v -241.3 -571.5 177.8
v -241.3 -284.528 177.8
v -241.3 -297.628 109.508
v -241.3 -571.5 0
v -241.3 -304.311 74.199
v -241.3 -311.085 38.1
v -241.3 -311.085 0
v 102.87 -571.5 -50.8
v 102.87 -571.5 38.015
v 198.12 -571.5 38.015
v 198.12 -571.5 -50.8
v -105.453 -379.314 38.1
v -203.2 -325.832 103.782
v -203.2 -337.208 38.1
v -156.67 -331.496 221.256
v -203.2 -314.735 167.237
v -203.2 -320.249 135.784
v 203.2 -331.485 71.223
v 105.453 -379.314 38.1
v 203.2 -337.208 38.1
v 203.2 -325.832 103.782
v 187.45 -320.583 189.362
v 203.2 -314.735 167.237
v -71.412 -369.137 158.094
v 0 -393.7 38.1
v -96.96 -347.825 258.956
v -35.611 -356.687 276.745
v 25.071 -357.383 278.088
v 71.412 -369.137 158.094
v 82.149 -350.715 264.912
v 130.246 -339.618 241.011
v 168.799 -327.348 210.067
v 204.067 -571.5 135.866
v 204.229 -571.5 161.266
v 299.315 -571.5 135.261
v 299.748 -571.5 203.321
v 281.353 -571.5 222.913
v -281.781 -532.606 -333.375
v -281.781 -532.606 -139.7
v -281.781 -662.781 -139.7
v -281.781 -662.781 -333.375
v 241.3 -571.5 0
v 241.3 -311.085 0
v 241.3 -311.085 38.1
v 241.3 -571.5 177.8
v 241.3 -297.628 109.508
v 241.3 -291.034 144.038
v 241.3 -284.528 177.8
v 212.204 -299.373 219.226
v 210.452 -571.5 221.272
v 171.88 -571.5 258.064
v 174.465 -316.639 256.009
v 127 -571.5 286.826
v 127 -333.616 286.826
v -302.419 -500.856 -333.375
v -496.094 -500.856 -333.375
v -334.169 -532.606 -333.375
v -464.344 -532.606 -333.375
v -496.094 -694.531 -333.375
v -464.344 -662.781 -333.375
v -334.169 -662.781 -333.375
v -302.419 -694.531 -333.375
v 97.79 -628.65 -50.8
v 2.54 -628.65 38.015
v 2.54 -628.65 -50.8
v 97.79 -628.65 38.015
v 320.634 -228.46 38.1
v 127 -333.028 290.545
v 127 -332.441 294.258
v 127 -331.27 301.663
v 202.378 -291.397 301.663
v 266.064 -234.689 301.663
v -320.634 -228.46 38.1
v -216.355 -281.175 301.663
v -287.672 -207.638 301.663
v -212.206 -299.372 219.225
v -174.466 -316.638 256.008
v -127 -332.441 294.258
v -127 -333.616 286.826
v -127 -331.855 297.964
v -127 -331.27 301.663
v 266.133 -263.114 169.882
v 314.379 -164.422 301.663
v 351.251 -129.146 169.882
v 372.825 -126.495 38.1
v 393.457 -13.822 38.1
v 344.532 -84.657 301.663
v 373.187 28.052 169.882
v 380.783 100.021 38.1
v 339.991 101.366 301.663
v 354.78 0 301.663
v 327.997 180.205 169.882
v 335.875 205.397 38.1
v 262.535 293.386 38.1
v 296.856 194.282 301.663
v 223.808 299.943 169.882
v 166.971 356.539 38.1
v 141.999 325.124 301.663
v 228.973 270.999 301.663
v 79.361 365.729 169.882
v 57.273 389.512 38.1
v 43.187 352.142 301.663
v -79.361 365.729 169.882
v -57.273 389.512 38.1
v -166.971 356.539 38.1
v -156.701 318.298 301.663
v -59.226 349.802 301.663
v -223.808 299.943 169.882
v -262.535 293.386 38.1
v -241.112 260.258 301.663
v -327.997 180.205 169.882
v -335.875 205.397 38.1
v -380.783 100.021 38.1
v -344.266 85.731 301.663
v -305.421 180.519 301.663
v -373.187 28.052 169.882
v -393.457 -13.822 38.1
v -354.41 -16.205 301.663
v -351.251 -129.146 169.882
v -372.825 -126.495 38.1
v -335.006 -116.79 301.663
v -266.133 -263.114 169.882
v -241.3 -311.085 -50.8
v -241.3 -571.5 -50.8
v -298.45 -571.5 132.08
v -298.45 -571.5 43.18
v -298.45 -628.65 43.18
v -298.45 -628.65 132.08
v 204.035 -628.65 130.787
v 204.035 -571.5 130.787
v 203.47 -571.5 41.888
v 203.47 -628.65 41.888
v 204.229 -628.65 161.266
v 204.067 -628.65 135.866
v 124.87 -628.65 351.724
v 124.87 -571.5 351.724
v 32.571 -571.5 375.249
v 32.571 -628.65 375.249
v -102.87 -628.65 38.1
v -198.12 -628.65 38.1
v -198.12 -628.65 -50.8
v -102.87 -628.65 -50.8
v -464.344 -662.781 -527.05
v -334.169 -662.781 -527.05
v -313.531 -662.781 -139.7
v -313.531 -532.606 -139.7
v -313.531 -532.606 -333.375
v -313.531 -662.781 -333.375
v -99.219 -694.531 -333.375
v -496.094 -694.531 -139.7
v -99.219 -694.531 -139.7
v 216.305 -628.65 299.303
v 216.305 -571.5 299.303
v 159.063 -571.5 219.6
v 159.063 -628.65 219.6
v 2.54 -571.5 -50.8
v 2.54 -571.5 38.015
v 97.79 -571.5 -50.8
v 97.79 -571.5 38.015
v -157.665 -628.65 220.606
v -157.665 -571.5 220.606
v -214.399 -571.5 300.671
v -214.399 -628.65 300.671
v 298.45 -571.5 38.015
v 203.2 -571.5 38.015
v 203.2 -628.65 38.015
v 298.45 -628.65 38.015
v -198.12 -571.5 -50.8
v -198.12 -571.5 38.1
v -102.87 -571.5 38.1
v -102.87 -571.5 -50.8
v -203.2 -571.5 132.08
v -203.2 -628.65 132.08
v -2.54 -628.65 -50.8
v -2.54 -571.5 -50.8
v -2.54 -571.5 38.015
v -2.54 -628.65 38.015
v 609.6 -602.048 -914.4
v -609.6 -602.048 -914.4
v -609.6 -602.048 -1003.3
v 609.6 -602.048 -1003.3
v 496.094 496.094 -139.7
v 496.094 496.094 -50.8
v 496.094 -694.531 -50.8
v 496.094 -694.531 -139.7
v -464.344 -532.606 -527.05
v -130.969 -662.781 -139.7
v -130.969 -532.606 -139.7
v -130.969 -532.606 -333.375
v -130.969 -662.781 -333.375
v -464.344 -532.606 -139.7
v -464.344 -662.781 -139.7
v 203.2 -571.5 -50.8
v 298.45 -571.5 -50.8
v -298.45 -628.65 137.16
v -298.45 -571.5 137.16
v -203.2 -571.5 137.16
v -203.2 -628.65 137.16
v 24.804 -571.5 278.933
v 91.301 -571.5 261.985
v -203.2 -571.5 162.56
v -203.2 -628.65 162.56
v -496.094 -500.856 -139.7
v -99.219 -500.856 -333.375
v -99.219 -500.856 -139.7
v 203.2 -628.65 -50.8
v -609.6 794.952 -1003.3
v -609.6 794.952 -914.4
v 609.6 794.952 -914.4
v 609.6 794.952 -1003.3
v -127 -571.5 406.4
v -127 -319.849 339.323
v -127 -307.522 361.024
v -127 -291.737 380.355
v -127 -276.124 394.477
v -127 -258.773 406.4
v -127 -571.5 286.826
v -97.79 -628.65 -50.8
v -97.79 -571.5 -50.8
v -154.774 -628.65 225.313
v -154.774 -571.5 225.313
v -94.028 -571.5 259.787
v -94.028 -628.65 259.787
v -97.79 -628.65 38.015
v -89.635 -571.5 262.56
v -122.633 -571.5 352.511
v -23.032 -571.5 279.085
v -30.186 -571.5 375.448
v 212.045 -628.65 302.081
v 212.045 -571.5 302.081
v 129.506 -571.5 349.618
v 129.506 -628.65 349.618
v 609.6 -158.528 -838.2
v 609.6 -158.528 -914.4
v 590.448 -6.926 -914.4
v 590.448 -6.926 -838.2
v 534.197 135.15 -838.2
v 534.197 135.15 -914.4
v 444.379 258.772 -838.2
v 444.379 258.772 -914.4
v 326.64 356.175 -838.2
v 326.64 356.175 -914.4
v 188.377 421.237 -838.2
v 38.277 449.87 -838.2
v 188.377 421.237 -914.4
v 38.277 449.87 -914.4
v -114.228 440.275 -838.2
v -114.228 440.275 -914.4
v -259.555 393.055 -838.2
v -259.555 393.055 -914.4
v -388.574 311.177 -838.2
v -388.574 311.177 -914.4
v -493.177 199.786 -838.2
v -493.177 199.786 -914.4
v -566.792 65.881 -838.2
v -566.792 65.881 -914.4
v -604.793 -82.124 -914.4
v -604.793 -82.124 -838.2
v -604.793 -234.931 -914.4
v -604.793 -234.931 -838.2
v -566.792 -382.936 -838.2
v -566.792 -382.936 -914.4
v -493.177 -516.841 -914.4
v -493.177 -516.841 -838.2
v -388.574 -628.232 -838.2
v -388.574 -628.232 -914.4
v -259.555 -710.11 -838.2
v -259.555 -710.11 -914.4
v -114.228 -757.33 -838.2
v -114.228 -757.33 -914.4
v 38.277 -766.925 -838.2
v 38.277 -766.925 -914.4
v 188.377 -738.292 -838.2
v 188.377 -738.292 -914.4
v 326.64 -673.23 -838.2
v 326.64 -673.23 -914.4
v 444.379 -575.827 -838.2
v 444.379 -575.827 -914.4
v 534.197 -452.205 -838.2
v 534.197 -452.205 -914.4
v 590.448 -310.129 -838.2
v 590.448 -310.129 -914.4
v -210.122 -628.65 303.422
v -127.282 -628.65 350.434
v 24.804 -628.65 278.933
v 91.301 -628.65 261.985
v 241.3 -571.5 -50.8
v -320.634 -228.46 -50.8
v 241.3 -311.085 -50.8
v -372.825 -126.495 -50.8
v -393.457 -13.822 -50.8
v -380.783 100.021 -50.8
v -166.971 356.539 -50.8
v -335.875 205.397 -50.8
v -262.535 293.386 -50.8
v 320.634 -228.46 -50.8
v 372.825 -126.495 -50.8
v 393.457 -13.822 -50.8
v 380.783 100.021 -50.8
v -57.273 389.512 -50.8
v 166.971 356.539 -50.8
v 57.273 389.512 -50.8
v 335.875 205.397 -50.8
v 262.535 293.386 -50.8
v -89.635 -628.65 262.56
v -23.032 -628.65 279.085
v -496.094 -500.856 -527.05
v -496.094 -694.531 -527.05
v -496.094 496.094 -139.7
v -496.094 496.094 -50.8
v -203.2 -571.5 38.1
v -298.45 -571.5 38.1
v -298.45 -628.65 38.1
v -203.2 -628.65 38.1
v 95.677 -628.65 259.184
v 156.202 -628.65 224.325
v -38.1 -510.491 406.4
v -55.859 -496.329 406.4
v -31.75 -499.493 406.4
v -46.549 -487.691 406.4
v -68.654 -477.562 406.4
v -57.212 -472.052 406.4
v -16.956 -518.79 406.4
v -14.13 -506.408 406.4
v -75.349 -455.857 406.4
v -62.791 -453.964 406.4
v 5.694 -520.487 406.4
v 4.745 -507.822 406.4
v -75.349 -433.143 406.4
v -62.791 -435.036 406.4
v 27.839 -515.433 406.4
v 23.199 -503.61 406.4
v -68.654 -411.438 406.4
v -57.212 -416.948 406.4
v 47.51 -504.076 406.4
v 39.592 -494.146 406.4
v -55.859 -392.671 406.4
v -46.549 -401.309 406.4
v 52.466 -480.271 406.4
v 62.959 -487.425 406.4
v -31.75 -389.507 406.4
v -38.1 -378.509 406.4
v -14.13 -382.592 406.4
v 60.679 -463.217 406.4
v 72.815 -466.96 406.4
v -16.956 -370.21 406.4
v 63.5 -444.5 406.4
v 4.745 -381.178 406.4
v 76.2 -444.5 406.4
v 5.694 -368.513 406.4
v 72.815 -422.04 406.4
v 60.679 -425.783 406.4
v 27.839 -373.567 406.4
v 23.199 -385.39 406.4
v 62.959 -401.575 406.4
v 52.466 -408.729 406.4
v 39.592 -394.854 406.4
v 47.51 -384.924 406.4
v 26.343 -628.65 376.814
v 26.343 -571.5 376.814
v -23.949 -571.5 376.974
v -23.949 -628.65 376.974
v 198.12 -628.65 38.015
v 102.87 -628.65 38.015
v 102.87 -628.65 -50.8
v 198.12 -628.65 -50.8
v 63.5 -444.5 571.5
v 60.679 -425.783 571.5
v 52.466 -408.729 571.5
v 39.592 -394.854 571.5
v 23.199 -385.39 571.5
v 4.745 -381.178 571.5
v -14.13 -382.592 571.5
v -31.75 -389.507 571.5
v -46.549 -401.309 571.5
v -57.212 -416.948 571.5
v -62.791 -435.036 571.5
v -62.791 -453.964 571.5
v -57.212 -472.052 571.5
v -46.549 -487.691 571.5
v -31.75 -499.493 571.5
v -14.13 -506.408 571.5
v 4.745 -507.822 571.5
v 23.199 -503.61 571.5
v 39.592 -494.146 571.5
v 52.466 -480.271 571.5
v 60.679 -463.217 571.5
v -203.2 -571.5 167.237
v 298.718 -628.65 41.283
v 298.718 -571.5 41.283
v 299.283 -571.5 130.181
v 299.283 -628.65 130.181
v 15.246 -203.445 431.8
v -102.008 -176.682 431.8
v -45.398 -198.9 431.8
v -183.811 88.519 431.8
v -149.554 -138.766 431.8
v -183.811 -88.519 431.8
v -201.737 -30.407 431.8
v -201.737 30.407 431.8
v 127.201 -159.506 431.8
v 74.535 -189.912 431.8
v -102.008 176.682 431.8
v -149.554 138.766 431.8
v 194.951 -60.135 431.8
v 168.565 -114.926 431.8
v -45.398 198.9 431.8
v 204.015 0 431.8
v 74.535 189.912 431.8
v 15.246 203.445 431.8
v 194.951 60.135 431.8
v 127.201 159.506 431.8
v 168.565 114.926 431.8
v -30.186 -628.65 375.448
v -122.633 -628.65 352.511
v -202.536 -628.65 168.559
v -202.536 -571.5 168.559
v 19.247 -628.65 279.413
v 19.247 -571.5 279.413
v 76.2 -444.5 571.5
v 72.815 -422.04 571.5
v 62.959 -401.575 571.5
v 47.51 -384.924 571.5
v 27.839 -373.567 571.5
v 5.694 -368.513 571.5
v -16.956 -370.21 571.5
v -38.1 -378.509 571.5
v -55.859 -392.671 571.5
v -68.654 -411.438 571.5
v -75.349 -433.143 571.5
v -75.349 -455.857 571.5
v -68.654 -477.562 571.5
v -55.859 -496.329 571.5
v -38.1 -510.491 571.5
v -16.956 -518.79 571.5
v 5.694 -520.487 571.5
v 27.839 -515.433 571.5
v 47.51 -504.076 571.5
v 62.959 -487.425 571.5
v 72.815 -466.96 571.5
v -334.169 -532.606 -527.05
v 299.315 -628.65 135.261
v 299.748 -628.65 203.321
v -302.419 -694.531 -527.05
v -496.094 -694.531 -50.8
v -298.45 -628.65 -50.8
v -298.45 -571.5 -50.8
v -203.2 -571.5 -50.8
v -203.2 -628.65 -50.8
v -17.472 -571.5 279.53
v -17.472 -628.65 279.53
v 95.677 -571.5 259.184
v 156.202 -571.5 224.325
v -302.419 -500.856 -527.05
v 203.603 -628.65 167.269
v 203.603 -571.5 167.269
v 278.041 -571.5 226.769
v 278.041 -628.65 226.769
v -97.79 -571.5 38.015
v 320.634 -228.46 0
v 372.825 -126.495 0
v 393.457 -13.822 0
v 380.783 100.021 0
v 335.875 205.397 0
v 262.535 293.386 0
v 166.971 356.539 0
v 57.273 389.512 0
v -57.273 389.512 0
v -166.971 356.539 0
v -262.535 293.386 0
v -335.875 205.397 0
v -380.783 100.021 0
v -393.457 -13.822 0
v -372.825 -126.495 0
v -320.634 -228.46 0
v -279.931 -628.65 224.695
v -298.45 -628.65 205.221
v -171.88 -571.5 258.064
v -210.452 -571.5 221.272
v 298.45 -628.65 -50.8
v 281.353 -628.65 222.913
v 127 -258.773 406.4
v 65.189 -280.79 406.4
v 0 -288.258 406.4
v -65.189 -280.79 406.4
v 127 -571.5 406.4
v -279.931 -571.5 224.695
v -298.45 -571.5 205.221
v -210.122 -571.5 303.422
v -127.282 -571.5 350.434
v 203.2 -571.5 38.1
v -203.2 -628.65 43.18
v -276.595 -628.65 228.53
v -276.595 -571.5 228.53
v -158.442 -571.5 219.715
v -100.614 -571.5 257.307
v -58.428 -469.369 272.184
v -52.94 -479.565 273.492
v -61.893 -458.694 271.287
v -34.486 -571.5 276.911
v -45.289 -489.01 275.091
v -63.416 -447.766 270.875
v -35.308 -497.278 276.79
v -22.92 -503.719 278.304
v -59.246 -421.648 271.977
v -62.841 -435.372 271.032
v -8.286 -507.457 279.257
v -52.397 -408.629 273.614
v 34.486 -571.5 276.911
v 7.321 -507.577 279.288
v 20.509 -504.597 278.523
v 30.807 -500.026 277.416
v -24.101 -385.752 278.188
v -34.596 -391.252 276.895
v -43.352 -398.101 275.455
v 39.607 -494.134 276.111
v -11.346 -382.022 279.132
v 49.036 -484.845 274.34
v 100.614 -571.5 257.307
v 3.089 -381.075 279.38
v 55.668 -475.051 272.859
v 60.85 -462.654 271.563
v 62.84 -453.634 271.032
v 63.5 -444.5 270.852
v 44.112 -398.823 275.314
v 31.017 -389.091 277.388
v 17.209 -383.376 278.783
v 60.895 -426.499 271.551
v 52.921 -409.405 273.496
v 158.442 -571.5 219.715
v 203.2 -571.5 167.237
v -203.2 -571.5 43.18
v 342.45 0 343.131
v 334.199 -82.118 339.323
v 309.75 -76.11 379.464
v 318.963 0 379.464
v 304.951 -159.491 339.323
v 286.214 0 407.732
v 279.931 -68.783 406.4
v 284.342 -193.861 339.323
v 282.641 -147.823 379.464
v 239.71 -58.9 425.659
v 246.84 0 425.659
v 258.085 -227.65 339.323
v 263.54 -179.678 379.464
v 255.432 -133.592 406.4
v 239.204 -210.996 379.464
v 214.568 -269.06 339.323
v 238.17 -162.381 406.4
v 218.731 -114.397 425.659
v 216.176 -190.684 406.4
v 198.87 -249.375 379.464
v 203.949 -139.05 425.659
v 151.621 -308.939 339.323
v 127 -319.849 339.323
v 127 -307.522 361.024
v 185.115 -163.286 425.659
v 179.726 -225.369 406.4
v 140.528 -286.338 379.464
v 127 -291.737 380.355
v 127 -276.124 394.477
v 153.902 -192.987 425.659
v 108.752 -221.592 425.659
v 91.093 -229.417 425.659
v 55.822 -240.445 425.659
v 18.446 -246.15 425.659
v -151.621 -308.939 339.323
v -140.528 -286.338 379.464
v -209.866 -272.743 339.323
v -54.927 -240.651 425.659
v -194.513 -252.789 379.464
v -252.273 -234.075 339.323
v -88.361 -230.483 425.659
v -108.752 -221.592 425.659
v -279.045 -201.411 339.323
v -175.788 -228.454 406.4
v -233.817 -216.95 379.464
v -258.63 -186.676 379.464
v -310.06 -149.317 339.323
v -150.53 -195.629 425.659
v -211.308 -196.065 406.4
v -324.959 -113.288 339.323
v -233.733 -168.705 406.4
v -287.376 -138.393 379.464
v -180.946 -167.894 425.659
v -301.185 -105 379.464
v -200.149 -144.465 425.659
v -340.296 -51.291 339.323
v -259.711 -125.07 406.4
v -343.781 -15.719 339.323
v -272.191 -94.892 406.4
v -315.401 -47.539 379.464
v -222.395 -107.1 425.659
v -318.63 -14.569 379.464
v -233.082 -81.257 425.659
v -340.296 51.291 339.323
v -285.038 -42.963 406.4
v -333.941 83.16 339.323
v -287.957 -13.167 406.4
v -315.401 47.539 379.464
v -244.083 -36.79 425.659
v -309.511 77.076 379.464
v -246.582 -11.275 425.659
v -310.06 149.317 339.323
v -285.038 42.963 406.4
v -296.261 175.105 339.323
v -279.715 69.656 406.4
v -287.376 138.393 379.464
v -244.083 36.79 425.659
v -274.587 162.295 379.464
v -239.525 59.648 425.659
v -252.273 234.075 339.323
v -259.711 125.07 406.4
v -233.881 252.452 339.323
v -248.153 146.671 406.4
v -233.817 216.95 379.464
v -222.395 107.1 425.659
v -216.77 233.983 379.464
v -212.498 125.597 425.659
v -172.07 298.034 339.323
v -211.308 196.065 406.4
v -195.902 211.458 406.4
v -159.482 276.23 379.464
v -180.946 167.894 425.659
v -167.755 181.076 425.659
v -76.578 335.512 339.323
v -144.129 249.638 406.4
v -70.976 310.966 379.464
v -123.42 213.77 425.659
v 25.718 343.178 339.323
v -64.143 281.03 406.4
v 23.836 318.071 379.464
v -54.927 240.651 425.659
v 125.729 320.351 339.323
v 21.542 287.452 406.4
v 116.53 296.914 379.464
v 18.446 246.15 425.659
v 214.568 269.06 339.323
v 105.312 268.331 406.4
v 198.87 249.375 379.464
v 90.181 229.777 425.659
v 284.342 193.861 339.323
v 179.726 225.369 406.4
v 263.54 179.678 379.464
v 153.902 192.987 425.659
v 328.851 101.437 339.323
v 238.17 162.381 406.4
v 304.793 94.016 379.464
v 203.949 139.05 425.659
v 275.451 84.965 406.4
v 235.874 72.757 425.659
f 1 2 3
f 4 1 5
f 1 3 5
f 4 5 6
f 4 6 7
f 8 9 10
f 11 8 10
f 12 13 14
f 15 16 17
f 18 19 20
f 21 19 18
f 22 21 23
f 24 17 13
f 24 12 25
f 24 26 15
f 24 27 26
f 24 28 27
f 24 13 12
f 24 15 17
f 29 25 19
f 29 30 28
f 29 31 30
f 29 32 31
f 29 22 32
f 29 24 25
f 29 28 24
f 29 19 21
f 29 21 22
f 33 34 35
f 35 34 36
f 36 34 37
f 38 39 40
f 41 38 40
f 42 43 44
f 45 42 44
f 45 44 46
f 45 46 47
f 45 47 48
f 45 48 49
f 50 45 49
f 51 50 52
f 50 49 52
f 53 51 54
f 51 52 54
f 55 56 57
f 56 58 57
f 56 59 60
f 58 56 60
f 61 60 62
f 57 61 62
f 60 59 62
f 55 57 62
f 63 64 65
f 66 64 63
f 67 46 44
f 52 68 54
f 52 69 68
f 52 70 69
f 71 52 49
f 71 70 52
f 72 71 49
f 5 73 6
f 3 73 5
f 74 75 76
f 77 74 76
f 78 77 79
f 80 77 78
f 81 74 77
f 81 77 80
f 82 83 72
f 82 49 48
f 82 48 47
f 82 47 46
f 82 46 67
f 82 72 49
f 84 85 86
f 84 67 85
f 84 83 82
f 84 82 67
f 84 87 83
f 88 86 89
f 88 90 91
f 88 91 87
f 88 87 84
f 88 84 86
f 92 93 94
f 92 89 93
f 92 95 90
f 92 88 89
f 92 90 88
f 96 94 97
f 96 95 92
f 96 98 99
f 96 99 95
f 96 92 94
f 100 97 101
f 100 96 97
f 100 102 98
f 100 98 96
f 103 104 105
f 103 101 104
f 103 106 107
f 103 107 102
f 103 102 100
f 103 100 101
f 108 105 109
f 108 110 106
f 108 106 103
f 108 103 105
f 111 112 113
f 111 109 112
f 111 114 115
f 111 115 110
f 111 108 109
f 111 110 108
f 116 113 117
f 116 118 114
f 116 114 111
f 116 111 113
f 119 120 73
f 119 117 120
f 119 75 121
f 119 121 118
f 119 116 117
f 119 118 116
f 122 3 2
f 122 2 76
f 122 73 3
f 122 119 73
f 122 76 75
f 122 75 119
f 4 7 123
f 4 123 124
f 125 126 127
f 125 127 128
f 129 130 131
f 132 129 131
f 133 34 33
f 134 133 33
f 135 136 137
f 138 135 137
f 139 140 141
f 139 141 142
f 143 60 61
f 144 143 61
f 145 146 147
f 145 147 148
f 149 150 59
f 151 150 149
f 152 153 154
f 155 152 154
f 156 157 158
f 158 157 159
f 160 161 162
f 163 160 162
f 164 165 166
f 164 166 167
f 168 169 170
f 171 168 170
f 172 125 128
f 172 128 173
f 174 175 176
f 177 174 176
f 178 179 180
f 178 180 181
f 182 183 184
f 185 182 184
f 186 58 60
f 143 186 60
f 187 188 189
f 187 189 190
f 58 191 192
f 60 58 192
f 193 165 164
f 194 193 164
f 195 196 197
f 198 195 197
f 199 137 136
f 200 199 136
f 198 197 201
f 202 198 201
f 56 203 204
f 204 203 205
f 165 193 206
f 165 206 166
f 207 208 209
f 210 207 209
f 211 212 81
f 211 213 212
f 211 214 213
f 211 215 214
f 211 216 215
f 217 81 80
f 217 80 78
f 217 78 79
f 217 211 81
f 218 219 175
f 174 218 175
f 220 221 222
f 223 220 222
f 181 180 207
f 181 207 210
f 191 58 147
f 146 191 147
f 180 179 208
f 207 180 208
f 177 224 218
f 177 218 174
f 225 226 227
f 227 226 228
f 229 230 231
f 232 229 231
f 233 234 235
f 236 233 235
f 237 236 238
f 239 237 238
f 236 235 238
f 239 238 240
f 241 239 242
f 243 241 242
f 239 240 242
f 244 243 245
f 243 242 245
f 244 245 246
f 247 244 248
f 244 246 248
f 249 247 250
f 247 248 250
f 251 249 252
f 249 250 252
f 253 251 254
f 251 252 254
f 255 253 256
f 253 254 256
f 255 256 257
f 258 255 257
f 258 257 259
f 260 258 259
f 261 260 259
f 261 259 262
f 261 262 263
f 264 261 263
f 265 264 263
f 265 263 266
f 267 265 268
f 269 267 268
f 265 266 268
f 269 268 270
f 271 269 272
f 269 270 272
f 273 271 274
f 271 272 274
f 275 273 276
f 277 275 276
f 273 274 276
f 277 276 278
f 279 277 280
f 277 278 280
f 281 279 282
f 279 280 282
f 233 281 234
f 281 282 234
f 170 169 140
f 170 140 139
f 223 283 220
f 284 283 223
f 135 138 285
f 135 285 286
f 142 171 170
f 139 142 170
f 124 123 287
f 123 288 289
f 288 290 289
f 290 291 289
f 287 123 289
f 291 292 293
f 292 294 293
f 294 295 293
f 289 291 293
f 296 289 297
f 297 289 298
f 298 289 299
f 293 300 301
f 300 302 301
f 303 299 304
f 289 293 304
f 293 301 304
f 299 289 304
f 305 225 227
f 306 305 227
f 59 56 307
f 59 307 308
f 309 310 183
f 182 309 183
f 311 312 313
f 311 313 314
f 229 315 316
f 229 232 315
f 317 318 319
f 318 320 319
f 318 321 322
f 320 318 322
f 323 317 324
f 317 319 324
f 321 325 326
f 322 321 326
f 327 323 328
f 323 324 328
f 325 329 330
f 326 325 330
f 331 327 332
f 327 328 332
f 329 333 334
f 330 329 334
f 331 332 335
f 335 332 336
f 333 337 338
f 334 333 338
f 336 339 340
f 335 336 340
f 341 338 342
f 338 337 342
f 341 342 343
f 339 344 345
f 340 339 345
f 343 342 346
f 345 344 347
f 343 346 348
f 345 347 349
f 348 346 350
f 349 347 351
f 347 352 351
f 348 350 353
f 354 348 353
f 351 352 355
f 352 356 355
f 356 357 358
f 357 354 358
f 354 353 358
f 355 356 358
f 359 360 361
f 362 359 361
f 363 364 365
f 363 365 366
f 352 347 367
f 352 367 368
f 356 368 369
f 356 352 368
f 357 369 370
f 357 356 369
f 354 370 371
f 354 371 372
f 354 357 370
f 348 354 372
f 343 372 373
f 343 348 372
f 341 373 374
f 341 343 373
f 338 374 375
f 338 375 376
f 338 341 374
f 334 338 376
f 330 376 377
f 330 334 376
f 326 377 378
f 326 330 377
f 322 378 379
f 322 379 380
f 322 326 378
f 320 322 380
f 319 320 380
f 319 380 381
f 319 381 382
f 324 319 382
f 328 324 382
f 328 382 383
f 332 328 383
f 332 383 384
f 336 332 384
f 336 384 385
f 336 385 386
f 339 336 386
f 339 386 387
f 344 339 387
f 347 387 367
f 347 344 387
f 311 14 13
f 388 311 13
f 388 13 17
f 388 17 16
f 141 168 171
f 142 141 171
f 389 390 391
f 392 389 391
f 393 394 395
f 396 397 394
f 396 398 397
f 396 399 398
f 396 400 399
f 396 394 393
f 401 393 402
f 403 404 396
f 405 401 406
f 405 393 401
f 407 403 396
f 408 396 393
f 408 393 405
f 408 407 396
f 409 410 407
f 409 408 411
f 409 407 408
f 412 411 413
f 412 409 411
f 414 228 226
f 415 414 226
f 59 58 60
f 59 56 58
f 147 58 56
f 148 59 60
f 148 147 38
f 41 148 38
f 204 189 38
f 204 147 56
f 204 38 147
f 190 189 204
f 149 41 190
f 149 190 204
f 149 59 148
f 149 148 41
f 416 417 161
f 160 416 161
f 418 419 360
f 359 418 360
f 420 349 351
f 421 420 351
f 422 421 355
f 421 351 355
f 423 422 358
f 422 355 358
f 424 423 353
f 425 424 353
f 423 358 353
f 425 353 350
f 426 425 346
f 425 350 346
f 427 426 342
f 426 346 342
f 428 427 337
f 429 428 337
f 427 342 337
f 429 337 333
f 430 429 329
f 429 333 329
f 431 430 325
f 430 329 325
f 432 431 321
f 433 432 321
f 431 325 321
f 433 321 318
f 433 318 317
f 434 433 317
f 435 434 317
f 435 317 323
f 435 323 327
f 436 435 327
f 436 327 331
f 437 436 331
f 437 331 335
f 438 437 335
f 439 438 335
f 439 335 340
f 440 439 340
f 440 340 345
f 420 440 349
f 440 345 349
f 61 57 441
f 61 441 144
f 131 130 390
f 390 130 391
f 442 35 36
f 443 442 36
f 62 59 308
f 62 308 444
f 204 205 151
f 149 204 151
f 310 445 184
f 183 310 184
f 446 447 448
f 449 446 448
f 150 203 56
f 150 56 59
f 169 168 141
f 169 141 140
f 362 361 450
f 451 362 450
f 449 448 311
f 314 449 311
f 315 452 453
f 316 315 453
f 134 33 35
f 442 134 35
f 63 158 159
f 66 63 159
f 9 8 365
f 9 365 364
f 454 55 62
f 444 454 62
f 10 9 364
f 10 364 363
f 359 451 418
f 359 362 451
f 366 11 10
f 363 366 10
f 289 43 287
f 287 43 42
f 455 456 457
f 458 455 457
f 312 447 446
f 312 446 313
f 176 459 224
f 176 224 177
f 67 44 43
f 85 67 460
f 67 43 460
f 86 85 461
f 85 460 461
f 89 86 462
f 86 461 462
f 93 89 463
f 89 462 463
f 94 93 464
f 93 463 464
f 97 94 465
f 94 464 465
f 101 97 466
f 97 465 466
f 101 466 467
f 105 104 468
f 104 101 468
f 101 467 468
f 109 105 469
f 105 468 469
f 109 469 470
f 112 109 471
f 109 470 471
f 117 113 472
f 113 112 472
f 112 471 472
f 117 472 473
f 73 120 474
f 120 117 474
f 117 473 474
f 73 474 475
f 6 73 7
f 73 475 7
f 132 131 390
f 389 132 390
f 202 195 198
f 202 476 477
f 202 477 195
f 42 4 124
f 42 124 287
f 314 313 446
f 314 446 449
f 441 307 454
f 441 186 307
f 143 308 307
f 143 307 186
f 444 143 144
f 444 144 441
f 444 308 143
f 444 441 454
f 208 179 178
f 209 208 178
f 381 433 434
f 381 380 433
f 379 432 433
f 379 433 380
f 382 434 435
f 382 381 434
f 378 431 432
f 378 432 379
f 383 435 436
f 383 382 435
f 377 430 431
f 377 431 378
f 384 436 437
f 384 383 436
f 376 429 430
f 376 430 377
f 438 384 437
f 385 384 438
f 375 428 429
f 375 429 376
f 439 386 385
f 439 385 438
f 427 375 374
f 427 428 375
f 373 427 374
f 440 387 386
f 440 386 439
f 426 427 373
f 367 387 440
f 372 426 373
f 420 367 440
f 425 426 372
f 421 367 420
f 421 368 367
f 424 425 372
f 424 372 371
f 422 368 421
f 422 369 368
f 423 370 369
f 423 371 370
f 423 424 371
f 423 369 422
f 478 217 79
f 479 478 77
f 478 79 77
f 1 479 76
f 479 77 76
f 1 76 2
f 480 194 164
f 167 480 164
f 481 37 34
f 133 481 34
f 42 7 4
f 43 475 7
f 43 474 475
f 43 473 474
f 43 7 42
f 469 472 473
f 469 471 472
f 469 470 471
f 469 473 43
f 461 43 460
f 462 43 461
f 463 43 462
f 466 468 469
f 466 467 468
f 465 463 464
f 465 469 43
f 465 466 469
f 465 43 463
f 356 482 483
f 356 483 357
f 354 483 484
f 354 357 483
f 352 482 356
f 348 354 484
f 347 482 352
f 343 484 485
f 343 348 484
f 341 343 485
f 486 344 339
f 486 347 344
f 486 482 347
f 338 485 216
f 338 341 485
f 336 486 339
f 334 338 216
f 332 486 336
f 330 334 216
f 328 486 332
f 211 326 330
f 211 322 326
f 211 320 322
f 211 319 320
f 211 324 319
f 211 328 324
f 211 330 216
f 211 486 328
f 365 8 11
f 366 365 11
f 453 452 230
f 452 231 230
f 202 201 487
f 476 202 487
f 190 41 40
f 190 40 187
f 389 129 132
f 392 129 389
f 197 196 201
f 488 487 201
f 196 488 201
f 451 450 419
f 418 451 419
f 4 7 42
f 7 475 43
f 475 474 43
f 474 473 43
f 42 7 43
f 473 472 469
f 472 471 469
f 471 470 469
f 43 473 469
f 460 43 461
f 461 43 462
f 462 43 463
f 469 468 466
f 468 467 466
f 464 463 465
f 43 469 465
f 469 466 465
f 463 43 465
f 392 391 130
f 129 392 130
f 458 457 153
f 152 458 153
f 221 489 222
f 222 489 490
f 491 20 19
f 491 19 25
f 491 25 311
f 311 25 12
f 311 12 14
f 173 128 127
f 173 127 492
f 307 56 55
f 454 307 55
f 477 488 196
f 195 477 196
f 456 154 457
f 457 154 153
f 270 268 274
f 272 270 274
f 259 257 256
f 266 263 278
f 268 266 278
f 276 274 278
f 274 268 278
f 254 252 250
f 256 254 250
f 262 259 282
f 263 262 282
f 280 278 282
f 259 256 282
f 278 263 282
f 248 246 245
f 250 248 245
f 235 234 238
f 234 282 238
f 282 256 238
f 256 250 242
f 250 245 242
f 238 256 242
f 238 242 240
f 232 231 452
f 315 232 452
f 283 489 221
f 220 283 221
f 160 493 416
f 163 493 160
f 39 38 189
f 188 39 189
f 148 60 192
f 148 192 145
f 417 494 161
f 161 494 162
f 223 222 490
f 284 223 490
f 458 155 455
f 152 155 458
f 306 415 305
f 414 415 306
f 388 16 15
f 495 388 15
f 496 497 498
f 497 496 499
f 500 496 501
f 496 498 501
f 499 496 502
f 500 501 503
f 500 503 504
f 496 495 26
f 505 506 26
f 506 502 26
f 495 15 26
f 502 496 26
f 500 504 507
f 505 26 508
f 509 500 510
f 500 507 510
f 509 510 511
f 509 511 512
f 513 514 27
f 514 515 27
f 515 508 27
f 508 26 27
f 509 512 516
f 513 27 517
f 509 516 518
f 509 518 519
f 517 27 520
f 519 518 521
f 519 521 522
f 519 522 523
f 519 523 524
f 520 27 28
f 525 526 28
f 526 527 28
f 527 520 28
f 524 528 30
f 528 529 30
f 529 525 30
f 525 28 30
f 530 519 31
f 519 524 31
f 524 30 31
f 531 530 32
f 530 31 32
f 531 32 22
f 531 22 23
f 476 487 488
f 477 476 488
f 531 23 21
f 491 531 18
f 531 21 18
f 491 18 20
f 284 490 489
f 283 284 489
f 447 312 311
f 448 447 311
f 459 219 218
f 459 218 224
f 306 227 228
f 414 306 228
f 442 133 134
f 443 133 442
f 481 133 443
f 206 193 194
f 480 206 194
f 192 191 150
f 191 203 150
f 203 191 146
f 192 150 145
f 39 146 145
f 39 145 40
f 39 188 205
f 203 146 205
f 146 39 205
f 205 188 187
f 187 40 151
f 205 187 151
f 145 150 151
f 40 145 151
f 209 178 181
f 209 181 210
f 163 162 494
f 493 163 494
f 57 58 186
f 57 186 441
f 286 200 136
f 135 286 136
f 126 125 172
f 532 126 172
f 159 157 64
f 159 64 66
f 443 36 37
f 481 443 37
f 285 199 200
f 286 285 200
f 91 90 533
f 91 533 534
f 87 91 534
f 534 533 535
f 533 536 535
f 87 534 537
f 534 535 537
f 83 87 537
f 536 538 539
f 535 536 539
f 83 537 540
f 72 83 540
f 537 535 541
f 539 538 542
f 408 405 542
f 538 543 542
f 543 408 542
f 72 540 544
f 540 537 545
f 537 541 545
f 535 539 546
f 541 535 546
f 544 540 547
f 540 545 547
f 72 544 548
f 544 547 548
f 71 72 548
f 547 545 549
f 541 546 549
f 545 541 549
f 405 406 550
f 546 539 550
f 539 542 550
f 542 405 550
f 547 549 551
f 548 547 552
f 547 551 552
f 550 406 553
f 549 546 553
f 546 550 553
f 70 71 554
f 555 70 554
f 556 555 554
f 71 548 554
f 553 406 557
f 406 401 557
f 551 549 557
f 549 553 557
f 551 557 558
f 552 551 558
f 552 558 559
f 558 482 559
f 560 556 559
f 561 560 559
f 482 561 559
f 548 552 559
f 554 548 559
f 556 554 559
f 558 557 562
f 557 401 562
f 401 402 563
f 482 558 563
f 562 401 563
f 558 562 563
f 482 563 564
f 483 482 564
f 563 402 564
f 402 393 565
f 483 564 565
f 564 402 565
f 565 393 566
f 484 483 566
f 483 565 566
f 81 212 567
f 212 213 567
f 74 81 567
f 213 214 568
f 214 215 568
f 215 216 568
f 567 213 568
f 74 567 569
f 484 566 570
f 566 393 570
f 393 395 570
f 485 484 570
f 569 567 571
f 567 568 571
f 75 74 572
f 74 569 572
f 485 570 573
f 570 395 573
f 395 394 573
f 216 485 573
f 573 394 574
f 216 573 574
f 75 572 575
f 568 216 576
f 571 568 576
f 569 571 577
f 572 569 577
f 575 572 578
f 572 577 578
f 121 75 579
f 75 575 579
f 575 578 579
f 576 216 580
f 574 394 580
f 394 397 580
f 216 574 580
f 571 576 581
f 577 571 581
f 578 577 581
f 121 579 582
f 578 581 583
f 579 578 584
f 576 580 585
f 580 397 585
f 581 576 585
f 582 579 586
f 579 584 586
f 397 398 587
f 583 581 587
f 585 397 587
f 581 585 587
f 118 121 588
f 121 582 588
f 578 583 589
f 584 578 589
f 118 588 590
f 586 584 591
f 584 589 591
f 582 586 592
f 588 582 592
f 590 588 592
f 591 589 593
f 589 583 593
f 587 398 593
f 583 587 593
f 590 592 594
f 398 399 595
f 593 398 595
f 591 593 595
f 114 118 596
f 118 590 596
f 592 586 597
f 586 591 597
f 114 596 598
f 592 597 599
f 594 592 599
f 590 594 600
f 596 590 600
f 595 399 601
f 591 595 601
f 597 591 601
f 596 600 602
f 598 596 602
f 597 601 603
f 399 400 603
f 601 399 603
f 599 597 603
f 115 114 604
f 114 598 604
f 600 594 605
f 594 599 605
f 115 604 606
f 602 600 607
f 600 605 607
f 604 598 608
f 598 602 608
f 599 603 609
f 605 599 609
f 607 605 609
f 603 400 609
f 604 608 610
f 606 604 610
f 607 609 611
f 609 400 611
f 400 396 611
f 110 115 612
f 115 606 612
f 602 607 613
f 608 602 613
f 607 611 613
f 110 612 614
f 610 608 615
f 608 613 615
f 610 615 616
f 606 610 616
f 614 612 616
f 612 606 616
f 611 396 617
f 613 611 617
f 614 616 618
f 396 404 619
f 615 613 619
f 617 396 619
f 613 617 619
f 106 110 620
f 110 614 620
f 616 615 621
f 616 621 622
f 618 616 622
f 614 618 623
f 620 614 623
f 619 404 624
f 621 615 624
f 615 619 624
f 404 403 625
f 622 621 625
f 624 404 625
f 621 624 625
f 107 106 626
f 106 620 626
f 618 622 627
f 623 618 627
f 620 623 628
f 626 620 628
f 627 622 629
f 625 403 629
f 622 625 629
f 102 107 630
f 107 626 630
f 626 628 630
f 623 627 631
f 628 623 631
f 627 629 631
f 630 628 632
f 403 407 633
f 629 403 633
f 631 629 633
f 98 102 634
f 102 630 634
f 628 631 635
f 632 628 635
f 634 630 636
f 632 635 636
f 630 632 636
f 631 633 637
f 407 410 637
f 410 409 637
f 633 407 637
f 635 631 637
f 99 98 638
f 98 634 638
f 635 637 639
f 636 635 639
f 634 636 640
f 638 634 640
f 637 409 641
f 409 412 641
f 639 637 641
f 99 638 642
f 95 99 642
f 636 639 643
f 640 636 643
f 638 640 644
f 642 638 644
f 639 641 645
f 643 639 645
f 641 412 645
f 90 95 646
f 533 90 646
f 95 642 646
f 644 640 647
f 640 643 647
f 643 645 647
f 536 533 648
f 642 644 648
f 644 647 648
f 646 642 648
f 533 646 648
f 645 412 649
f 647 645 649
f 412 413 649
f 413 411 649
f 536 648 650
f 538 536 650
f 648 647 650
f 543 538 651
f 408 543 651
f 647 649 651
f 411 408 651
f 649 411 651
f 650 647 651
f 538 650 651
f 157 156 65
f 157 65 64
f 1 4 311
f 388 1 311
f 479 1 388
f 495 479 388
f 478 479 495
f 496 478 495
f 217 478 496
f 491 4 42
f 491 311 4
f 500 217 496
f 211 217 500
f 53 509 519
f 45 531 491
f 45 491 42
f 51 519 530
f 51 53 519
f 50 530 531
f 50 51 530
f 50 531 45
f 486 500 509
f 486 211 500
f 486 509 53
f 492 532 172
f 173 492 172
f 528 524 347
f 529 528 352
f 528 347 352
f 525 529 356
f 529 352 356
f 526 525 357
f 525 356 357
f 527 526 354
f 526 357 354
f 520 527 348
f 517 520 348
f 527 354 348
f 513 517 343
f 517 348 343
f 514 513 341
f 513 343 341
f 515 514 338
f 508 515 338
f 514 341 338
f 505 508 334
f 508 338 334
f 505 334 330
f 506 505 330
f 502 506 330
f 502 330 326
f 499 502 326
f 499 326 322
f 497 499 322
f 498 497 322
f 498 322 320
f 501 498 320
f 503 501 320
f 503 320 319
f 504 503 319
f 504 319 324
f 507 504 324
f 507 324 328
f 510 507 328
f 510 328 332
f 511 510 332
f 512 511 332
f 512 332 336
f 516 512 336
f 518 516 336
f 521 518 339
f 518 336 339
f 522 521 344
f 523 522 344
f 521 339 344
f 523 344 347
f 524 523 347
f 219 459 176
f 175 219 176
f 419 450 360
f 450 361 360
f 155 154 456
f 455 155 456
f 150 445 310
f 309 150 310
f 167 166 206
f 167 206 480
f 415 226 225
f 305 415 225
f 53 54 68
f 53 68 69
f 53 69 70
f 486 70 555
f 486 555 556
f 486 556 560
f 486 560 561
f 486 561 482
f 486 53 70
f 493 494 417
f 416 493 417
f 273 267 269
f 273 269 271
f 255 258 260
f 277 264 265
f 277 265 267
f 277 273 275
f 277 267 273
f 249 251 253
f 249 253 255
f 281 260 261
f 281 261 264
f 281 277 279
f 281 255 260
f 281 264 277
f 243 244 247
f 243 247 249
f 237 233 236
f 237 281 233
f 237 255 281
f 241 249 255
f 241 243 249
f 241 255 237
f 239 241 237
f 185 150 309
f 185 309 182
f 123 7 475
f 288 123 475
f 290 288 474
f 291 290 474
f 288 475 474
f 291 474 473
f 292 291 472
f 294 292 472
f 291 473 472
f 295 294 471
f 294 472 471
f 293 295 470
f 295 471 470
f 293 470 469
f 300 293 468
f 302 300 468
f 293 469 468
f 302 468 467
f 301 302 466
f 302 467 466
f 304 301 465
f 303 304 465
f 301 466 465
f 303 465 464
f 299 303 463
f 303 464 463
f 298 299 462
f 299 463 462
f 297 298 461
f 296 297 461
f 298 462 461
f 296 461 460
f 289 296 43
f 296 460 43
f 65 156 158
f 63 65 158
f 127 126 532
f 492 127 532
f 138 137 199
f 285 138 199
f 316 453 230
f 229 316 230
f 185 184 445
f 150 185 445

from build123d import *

# Parameters (mm, degrees)
F0_R      = 393.7
F1_DEPTH  = 38.1
F1_FACE_R = 393.7
F2_DEPTH  = 393.7
F2_TAPER  = 8.4
F3_R      = 152.4
F5_DEPTH  = 571.5
F7_DEPTH  = 313.7270858023
F8_R      = 63.5
F9_DEPTH  = 233.38389
F10_DEPTH = 50.8
F11_R     = 76.2
F11_R_2   = 63.5
F12_DEPTH = 165.1
F16_W     = 95.25
F16_H     = 88.9
F17_DEPTH = 57.15
F16_H_2   = 88.8147211254
F20_W     = 396.875
F20_H     = 193.675
F20_W_2   = 150.8125
F20_H_2   = 130.175
F21_DEPTH = 193.675
F23_DEPTH = 88.9
F24_W     = 193.675
F24_H     = 193.675
F24_W_2   = 130.175
F24_H_2   = 130.175
F25_DEPTH = 193.675
F19_W     = 1219.2
F19_H     = 1397
F26_DEPTH = 88.9
F27_R     = 609.6
F28_DEPTH = 76.2


with BuildPart() as f1:
    # F0 (on Top) → F1 (new body)
    with BuildSketch(Plane.XY):
        Circle(F0_R)
    extrude(amount=F1_DEPTH)

    # F1_face (on face) → F2 (join)
    with BuildSketch(Plane.XY.offset(38.1)):
        Circle(F1_FACE_R)
    extrude(amount=F2_DEPTH, taper=F2_TAPER)

    # F3
    f3_edges = [f1.edges().sort_by_distance(p)[0] for p in [
        (-335.563442, 0, 431.8),
    ]]
    fillet(f3_edges, radius=F3_R)

    # F4 (on Front) → F5 (join)
    with BuildSketch(Plane.XZ):
        with BuildLine():
            Line((-241.3, 0), (0, 0))
            Line((0, 0), (241.3, 0))
            Line((241.3, 0), (241.3, 177.8))
            ThreePointArc((241.3, 177.8), (0, 317.5), (-241.3, 177.8))
            Line((-241.3, 177.8), (-241.3, 0))
        make_face()
        with BuildLine():
            Line((-203.2, 38.1), (-203.2, 167.2373542175))
            ThreePointArc((-203.2, 167.2373542175), (0, 279.4), (203.2, 167.2373542175))
            Line((203.2, 167.2373542175), (203.2, 38.1))
            Line((203.2, 38.1), (-203.2, 38.1))
        make_face(mode=Mode.SUBTRACT)
    extrude(amount=F5_DEPTH)

    # F6 (on face) → F7 (join, up to face)
    with BuildSketch(Plane.XZ.offset(571.5)):
        with BuildLine():
            Line((127, 406.4), (0, 406.4))
            Line((0, 406.4), (-127, 406.4))
            Line((-127, 406.4), (-127, 272.2534450197))
            ThreePointArc((-127, 272.2534450197), (0, 304.4772434248), (127, 272.2534450197))
            Line((127, 272.2534450197), (127, 406.4))
        make_face()
    extrude(amount=-F7_DEPTH)

    # F8 (on face) → F9 (cut)
    with BuildSketch(Plane.XY.offset(406.4)):
        with Locations((0, -444.5)):
            Circle(F8_R)
    extrude(amount=-F9_DEPTH, mode=Mode.SUBTRACT)


with BuildPart() as f10:
    # F10 (new): a face of the model
    f10_faces = [f1.part.faces().sort_by_distance(p)[0] for p in [
        (0, -78.7343872784, 0),
    ]]
    extrude(f10_faces, amount=F10_DEPTH)


with BuildPart() as f12:
    # F11 (on face) → F12 (new body)
    with BuildSketch(Plane.XY.offset(406.4)):
        with Locations((0, -444.5)):
            Circle(F11_R)
        with Locations((0, -444.5)):
            Circle(F11_R_2, mode=Mode.SUBTRACT)
    extrude(amount=F12_DEPTH)


with BuildPart() as f17:
    # F16 (on face) → F17 (new body)
    with BuildSketch(Plane.XZ.offset(571.5)):
        with Locations((-250.825, 87.63)):
            Rectangle(F16_W, F16_H)
    extrude(amount=F17_DEPTH)


with BuildPart() as f17b:
    # F16 (on face) → F17, piece 2 (new body)
    with BuildSketch(Plane.XZ.offset(571.5)):
        Polygon((-298.45, 137.16), (-203.2, 137.16), (-203.2, 162.56), (-279.9308058132, 224.6953814017), (-298.45, 205.2213698626), align=None)
    extrude(amount=F17_DEPTH)


with BuildPart() as f17c:
    # F16 (on face) → F17, piece 3 (new body)
    with BuildSketch(Plane.XZ.offset(571.5)):
        with Locations((-250.825, -6.35)):
            Rectangle(F16_W, F16_H)
    extrude(amount=F17_DEPTH)


with BuildPart() as f17d:
    # F16 (on face) → F17, piece 4 (new body)
    with BuildSketch(Plane.XZ.offset(571.5)):
        with Locations((-150.495, -6.35)):
            Rectangle(F16_W, F16_H)
    extrude(amount=F17_DEPTH)


with BuildPart() as f17e:
    # F16 (on face) → F17, piece 5 (new body)
    with BuildSketch(Plane.XZ.offset(571.5)):
        with Locations((-50.165, -6.3926394373)):
            Rectangle(F16_W, F16_H_2)
    extrude(amount=F17_DEPTH)


with BuildPart() as f17f:
    # F16 (on face) → F17, piece 6 (new body)
    with BuildSketch(Plane.XZ.offset(571.5)):
        with Locations((50.165, -6.3926394373)):
            Rectangle(F16_W, F16_H_2)
    extrude(amount=F17_DEPTH)


with BuildPart() as f17g:
    # F16 (on face) → F17, piece 7 (new body)
    with BuildSketch(Plane.XZ.offset(571.5)):
        with Locations((250.825, -6.3926394373)):
            Rectangle(F16_W, F16_H_2)
    extrude(amount=F17_DEPTH)


with BuildPart() as f17h:
    # F16 (on face) → F17, piece 8 (new body)
    with BuildSketch(Plane.XZ.offset(571.5)):
        with Locations((150.495, -6.3926394373)):
            Rectangle(F16_W, F16_H_2)
    extrude(amount=F17_DEPTH)


with BuildPart() as f17i:
    # F16 (on face) → F17, piece 9 (new body)
    with BuildSketch(Plane.XZ.offset(571.5)):
        Polygon((-276.5945702872, 228.5304897365), (-202.5362449804, 168.5592403779), (-157.664527389, 220.6061931845), (-214.3991652094, 300.6712832393), align=None)
    extrude(amount=F17_DEPTH)


with BuildPart() as f17j:
    # F16 (on face) → F17, piece 10 (new body)
    with BuildSketch(Plane.XZ.offset(571.5)):
        Polygon((-210.122006613, 303.4216771878), (-154.773605293, 225.3128726494), (-94.0282642841, 259.7865760326), (-127.2824433394, 350.4341144425), align=None)
    extrude(amount=F17_DEPTH)


with BuildPart() as f17k:
    # F16 (on face) → F17, piece 11 (new body)
    with BuildSketch(Plane.XZ.offset(571.5)):
        Polygon((-23.0320143219, 279.0853518379), (-30.1862995769, 375.4484061295), (-122.6331221524, 352.5105009135), (-89.634620555, 262.5599134685), align=None)
    extrude(amount=F17_DEPTH)


with BuildPart() as f17l:
    # F16 (on face) → F17, piece 12 (new body)
    with BuildSketch(Plane.XZ.offset(571.5)):
        Polygon((-17.4719436025, 279.5297109173), (0.8876737155, 279.4713960058), (19.2472910336, 279.4130810943), (26.3430174587, 376.8142169835), (1.1971134766, 376.8940869034), (-23.9487905055, 376.9739568233), align=None)
    extrude(amount=F17_DEPTH)


with BuildPart() as f17m:
    # F16 (on face) → F17, piece 13 (new body)
    with BuildSketch(Plane.XZ.offset(571.5)):
        Polygon((95.676649655, 259.1840239711), (156.2017723463, 224.3251341085), (212.0452395799, 302.0807644026), (129.5059921651, 349.618487699), align=None)
    extrude(amount=F17_DEPTH)


with BuildPart() as f17n:
    # F16 (on face) → F17, piece 14 (new body)
    with BuildSketch(Plane.XZ.offset(571.5)):
        Polygon((203.6029234186, 167.2692369293), (278.0407191214, 226.7688240521), (216.3048401215, 299.3032554906), (159.0627371416, 219.6001851575), align=None)
    extrude(amount=F17_DEPTH)


with BuildPart() as f17o:
    # F16 (on face) → F17, piece 15 (new body)
    with BuildSketch(Plane.XZ.offset(571.5)):
        Polygon((299.283010442, 130.1814447638), (204.0349323057, 130.7865161207), (203.4701990392, 41.8883098602), (298.7182771755, 41.2832385032), align=None)
    extrude(amount=F17_DEPTH)


with BuildPart() as f17p:
    # F16 (on face) → F17, piece 16 (new body)
    with BuildSketch(Plane.XZ.offset(571.5)):
        Polygon((124.8699549397, 351.7243668791), (32.5707096832, 375.2490735739), (24.804426796, 278.9334108806), (91.3007120784, 261.9852158741), align=None)
    extrude(amount=F17_DEPTH)


with BuildPart() as f17q:
    # F16 (on face) → F17, piece 17 (new body)
    with BuildSketch(Plane.XZ.offset(571.5)):
        Polygon((299.7476377167, 203.3213388494), (281.3525249782, 222.9125998118), (204.22855514, 161.2659011243), (204.0672027781, 135.8664136213), (299.3152809144, 135.2613422644), align=None)
    extrude(amount=F17_DEPTH)


with BuildPart() as f21:
    # F20 (on offset) → F21 (new body)
    with BuildSketch(Plane(origin=(0, 0, -139.7), x_dir=(1, 0, 0), z_dir=(0, 0, -1))):
        with Locations((-297.65625, 597.69375)):
            Rectangle(F20_W, F20_H)
        with Locations((-388.9375, 597.69375)):
            Rectangle(F20_W_2, F20_H_2, mode=Mode.SUBTRACT)
        with Locations((-206.375, 597.69375)):
            Rectangle(F20_W_2, F20_H_2, mode=Mode.SUBTRACT)
    extrude(amount=F21_DEPTH)


with BuildPart() as f23:
    # F22 (on offset) → F23 (new body)
    with BuildSketch(Plane(origin=(0, 0, -50.8), x_dir=(1, 0, 0), z_dir=(0, 0, -1))):
        Polygon((-496.09375, 694.53125), (-496.09375, -496.09375), (496.09375, -496.09375), (496.09375, 694.53125), (297.65625, 694.53125), align=None)
    extrude(amount=F23_DEPTH)


with BuildPart() as f25:
    # F24 (on face) → F25 (new body)
    with BuildSketch(Plane(origin=(0, 0, -333.375), x_dir=(1, 0, 0), z_dir=(0, 0, -1))):
        with Locations((-399.25625, 597.69375)):
            Rectangle(F24_W, F24_H)
        with Locations((-399.25625, 597.69375)):
            Rectangle(F24_W_2, F24_H_2, mode=Mode.SUBTRACT)
    extrude(amount=F25_DEPTH)


with BuildPart() as f26:
    # F19 (on offset) → F26 (new body)
    with BuildSketch(Plane.XY.offset(-914.4)):
        with Locations((0, 96.4519628315)):
            Rectangle(F19_W, F19_H)
    extrude(amount=-F26_DEPTH)


with BuildPart() as f28:
    # F27 (on offset) → F28 (new body)
    with BuildSketch(Plane.XY.offset(-914.4)):
        with Locations((0, -158.5275032271)):
            Circle(F27_R)
    extrude(amount=F28_DEPTH)


solid = Compound([f1.part, f10.part, f12.part, f17.part, f17b.part, f17c.part, f17d.part, f17e.part, f17f.part, f17g.part, f17h.part, f17i.part, f17j.part, f17k.part, f17l.part, f17m.part, f17n.part, f17o.part, f17p.part, f17q.part, f21.part, f23.part, f25.part, f26.part, f28.part])
